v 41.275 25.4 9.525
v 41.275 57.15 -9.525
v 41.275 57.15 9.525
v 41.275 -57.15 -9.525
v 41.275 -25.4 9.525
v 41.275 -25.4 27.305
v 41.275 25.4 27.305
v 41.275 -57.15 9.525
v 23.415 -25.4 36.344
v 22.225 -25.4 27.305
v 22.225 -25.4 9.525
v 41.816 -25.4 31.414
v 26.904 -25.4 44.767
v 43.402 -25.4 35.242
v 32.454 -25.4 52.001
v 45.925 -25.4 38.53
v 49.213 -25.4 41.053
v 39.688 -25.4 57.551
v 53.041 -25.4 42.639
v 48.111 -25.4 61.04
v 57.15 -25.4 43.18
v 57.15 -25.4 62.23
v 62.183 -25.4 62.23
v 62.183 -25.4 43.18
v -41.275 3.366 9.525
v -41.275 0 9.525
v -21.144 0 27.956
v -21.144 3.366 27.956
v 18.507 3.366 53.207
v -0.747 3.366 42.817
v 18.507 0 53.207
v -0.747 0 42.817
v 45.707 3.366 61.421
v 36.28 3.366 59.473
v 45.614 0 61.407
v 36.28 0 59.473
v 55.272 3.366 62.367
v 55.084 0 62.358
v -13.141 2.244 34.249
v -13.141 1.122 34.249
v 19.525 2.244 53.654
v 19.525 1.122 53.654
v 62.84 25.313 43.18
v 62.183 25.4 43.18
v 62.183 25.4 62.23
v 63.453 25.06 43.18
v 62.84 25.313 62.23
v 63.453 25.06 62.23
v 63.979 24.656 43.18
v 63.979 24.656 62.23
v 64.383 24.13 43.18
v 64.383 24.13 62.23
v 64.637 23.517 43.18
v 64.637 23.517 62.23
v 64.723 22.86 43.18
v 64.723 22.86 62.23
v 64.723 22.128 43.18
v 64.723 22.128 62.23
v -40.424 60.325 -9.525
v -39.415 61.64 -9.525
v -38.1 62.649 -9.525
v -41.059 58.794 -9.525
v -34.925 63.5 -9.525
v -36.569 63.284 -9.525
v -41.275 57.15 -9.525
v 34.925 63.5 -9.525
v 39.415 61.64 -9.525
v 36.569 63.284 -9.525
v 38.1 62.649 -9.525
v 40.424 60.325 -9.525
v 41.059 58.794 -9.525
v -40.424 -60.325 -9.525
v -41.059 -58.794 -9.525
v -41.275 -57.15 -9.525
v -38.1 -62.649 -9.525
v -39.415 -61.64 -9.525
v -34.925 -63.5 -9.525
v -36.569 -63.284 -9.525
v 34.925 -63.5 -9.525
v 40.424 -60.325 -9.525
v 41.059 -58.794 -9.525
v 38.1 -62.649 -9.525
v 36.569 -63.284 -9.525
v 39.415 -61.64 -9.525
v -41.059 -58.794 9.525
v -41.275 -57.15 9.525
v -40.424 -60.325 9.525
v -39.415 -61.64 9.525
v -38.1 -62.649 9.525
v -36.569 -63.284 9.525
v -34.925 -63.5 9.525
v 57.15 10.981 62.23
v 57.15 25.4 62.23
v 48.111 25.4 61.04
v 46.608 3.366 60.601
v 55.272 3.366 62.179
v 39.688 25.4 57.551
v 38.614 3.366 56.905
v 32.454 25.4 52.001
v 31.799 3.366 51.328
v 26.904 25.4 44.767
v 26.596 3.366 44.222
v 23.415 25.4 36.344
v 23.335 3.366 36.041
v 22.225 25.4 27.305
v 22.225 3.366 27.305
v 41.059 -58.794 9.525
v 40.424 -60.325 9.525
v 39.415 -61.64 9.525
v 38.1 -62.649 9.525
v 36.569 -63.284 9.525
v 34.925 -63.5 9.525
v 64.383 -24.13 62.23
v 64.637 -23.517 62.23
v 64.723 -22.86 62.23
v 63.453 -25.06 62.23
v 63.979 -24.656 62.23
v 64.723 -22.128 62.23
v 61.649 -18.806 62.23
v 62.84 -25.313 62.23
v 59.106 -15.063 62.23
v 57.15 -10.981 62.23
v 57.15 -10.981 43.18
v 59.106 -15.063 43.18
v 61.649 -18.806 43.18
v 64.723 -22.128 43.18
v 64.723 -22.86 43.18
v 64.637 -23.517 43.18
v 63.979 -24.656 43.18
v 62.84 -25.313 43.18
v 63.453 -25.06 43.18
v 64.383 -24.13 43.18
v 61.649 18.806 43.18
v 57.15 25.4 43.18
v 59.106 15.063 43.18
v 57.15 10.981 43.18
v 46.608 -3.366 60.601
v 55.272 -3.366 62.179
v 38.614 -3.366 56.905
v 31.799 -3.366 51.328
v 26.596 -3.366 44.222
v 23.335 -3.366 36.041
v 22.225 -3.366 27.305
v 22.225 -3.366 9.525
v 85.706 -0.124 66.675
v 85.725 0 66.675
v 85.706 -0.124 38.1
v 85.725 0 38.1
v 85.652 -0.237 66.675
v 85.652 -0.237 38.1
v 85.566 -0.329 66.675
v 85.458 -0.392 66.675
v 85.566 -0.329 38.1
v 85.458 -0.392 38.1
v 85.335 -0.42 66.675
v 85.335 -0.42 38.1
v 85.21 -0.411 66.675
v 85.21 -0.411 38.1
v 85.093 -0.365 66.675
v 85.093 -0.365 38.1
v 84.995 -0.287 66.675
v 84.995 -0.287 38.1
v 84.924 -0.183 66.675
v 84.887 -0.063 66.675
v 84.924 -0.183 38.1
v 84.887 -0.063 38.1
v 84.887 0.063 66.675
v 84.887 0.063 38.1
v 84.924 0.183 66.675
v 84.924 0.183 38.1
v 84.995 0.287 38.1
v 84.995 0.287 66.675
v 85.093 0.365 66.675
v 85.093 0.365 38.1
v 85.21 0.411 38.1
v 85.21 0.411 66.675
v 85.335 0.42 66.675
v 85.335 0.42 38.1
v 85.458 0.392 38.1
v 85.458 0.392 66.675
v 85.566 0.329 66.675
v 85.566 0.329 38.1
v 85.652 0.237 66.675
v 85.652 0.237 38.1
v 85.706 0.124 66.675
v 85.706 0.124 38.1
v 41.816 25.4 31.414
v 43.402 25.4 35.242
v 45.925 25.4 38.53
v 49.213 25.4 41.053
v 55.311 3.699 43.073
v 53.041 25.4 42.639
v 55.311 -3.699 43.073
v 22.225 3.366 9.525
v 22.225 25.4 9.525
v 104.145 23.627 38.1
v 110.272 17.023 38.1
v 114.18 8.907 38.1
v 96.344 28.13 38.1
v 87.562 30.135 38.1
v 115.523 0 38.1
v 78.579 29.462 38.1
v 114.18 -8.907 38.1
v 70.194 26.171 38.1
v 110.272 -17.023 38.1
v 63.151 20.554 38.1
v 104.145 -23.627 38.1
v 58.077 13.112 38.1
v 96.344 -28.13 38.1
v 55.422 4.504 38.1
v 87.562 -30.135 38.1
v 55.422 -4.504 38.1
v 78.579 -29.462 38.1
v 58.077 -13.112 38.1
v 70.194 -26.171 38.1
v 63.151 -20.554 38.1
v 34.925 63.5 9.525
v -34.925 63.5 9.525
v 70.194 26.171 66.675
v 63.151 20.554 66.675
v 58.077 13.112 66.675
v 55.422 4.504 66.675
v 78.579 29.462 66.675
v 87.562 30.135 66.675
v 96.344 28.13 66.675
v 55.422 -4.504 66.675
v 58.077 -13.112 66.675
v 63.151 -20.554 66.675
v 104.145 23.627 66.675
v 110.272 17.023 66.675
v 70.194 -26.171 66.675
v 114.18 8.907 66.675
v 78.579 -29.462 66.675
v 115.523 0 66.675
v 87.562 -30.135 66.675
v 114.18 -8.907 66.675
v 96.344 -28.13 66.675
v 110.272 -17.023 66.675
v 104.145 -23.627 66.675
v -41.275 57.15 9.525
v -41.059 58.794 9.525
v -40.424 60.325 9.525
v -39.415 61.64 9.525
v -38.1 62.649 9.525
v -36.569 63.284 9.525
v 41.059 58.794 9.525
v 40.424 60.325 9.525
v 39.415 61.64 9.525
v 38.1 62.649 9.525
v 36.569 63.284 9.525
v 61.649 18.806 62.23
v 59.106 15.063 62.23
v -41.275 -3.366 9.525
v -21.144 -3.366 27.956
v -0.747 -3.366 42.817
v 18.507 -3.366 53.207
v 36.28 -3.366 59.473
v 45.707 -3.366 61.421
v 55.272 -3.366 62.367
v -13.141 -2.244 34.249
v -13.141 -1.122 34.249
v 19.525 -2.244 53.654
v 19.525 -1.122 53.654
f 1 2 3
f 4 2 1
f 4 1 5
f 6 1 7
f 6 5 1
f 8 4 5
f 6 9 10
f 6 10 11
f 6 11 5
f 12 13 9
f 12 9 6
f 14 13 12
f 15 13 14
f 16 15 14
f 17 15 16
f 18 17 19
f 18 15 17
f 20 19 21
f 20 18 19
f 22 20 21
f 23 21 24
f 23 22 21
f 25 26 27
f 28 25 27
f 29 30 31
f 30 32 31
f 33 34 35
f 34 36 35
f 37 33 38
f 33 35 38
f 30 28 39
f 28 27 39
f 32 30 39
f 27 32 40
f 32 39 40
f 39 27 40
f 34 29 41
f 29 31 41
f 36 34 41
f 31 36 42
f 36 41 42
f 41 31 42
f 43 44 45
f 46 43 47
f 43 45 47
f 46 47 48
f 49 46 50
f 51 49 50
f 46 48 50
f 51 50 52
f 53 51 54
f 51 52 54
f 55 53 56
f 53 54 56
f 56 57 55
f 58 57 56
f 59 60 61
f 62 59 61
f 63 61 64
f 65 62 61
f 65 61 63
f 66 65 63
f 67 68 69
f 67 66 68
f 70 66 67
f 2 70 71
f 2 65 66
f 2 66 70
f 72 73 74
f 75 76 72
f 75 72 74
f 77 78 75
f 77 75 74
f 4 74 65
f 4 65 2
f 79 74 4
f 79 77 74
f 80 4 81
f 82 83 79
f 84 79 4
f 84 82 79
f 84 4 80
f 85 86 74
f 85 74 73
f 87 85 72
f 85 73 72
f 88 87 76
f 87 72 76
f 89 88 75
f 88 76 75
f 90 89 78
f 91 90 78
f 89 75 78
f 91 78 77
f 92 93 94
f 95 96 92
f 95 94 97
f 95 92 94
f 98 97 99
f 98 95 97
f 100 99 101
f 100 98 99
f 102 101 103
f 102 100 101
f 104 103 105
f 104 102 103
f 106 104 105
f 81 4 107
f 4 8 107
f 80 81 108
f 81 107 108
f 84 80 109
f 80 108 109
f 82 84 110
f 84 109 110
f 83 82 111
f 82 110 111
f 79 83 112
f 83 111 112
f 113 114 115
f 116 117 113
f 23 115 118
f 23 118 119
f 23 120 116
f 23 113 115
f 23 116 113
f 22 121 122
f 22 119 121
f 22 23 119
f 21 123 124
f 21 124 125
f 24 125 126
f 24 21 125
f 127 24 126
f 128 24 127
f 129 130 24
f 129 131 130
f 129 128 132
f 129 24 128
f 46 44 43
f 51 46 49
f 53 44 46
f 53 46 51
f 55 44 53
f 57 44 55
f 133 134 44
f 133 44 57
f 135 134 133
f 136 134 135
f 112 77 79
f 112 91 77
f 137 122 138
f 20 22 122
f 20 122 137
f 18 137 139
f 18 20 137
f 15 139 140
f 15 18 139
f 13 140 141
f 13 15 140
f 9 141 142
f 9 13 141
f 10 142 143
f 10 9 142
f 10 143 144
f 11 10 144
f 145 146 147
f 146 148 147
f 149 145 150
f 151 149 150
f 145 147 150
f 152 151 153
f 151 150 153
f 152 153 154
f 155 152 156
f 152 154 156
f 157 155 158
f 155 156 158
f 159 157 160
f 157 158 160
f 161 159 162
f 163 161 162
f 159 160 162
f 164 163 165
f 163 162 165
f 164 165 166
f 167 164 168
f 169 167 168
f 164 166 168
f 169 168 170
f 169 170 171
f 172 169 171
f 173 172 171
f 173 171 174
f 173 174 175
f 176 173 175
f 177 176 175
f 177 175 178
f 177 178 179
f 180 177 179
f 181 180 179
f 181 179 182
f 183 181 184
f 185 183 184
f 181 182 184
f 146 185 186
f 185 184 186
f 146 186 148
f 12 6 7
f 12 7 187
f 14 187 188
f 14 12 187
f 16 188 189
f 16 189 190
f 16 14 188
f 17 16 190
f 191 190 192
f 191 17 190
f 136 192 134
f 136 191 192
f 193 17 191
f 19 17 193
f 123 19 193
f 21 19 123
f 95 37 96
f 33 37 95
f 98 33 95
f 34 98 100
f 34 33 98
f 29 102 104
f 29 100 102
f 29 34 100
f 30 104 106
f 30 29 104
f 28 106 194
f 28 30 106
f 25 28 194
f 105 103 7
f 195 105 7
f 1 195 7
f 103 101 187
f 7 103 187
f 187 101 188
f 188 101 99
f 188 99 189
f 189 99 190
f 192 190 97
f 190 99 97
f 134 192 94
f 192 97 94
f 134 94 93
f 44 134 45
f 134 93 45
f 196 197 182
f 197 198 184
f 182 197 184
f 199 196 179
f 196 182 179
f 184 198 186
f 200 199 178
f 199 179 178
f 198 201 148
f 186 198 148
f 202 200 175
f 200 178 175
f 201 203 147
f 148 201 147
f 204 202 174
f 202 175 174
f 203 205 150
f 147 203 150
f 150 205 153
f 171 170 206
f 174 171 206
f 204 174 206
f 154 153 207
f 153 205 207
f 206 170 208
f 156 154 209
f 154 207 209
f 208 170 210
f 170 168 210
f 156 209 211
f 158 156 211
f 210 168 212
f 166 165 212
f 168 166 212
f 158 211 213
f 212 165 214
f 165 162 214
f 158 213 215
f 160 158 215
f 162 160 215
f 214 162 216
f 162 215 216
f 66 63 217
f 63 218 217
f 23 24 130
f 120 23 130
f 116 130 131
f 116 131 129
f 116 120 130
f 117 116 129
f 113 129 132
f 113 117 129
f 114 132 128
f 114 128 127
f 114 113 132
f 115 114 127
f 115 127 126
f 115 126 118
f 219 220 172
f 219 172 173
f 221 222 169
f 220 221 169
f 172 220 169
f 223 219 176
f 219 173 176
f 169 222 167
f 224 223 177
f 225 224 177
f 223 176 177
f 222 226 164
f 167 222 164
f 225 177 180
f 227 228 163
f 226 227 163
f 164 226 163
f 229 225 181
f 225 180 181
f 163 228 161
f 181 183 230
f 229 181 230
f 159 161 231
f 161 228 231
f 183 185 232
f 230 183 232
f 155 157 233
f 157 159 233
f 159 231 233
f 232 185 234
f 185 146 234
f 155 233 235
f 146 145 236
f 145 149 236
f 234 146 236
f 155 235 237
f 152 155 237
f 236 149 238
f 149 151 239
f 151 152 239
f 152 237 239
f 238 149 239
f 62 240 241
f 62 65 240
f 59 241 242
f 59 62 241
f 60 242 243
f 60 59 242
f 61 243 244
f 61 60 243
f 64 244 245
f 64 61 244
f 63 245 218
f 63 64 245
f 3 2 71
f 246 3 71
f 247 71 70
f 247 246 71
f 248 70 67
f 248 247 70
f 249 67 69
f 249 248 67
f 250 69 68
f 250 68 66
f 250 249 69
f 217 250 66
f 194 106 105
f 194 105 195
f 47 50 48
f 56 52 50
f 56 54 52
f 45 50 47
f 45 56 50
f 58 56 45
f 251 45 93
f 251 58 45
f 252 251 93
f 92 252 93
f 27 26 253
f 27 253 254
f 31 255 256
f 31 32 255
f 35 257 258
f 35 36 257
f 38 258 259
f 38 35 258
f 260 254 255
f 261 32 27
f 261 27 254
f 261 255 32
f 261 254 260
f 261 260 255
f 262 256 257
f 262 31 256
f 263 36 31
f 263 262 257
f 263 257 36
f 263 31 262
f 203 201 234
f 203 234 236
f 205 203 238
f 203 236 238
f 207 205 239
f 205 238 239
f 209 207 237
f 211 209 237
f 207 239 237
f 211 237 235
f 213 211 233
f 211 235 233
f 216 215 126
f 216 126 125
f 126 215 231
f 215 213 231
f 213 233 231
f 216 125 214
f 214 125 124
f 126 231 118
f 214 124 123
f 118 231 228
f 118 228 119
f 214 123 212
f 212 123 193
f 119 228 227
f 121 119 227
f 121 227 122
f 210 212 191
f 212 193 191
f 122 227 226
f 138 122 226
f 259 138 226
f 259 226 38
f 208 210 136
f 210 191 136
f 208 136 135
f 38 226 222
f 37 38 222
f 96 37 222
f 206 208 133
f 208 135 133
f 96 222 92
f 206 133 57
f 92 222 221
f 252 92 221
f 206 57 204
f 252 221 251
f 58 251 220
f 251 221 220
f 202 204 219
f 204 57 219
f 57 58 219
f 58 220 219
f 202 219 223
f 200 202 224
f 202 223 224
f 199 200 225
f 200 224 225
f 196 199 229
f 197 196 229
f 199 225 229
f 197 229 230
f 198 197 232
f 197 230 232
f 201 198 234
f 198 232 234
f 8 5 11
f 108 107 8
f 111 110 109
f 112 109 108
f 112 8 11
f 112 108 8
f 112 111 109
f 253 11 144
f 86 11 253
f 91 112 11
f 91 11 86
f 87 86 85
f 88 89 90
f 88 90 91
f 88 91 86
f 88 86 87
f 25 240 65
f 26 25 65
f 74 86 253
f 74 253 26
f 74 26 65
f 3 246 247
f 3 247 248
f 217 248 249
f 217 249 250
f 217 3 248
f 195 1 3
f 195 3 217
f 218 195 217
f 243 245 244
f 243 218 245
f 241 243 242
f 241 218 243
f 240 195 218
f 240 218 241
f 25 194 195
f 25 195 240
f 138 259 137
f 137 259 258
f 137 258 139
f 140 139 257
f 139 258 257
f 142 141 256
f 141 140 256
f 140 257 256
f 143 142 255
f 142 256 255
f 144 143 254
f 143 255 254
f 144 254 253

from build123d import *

# Parameters (mm, degrees)
F1_DEPTH = 63.5
F2_DEPTH = 25.4
F3_DEPTH = 3.3655
F6_R     = 6.35
F7_R     = 2.54
F8_R     = 2.54


with BuildPart() as f1:
    # F0 (on Front) → F1 (new body, symmetric)
    with BuildSketch(Plane.XZ):
        Polygon((-41.275, -9.525), (41.275, -9.525), (41.275, 9.525), (22.225, 9.525), (-41.275, 9.525), align=None)
    extrude(amount=F1_DEPTH, both=True)

    # F0 (on Front) → F2 (join, symmetric)
    with BuildSketch(Plane.XZ):
        with BuildLine():
            Line((22.225, 9.525), (41.275, 9.525))
            Line((41.275, 9.525), (41.275, 27.305))
            ThreePointArc((41.275, 27.305), (45.9246798487, 38.5303201513), (57.15, 43.18))
            Line((57.15, 43.18), (64.7230581194, 43.18))
            Line((64.7230581194, 43.18), (64.7230581194, 62.23))
            Line((64.7230581194, 62.23), (57.15, 62.23))
            ThreePointArc((57.15, 62.23), (32.4542956671, 52.0007043329), (22.225, 27.305))
            Line((22.225, 27.305), (22.225, 9.525))
        make_face()
    extrude(amount=F2_DEPTH, both=True)

    # F0 (on Front) → F3 (join, symmetric)
    with BuildSketch(Plane.XZ):
        with BuildLine():
            add(Edge.make_bspline(
                [(-41.275, 9.525), (-13.7296449393, 37.2954718769), (24.3855025619, 65.1646107435), (64.7230581194, 62.23)],
                knots=[0, 0, 0, 0, 118.3782300514, 118.3782300514, 118.3782300514, 118.3782300514], degree=3))
            Line((-41.275, 9.525), (22.225, 9.525))
            Line((22.225, 9.525), (22.225, 27.305))
            ThreePointArc((22.225, 27.305), (32.4542956671, 52.0007043329), (57.15, 62.23))
            Line((57.15, 62.23), (64.7230581194, 62.23))
        make_face()
    extrude(amount=F3_DEPTH, both=True)

    # F0 (on Front) → F5 (revolve)
    with BuildSketch(Plane.XZ):
        Polygon((85.725, 66.675), (85.725, 62.23), (85.725, 43.18), (85.725, 38.1), (115.5230581194, 38.1), (115.5230581194, 66.675), align=None)
    revolve(axis=Axis((85.3036269546, 0, 52.5564104319), (0, 0, -1)))

    # F6
    f6_edges = [f1.edges().sort_by_distance(p)[0] for p in [
        (-41.275, -63.5, 0),
        (41.275, -63.5, 0),
        (41.275, 63.5, 0),
        (-41.275, 63.5, 0),
    ]]
    fillet(f6_edges, radius=F6_R)

    # F7
    f7_edges = [f1.edges().sort_by_distance(p)[0] for p in [
        (64.723058, -25.4, 52.705),
    ]]
    fillet(f7_edges, radius=F7_R)

    # F8
    f8_edges = [f1.edges().sort_by_distance(p)[0] for p in [
        (64.723058, 25.4, 52.705),
    ]]
    fillet(f8_edges, radius=F8_R)


solid = f1.part
